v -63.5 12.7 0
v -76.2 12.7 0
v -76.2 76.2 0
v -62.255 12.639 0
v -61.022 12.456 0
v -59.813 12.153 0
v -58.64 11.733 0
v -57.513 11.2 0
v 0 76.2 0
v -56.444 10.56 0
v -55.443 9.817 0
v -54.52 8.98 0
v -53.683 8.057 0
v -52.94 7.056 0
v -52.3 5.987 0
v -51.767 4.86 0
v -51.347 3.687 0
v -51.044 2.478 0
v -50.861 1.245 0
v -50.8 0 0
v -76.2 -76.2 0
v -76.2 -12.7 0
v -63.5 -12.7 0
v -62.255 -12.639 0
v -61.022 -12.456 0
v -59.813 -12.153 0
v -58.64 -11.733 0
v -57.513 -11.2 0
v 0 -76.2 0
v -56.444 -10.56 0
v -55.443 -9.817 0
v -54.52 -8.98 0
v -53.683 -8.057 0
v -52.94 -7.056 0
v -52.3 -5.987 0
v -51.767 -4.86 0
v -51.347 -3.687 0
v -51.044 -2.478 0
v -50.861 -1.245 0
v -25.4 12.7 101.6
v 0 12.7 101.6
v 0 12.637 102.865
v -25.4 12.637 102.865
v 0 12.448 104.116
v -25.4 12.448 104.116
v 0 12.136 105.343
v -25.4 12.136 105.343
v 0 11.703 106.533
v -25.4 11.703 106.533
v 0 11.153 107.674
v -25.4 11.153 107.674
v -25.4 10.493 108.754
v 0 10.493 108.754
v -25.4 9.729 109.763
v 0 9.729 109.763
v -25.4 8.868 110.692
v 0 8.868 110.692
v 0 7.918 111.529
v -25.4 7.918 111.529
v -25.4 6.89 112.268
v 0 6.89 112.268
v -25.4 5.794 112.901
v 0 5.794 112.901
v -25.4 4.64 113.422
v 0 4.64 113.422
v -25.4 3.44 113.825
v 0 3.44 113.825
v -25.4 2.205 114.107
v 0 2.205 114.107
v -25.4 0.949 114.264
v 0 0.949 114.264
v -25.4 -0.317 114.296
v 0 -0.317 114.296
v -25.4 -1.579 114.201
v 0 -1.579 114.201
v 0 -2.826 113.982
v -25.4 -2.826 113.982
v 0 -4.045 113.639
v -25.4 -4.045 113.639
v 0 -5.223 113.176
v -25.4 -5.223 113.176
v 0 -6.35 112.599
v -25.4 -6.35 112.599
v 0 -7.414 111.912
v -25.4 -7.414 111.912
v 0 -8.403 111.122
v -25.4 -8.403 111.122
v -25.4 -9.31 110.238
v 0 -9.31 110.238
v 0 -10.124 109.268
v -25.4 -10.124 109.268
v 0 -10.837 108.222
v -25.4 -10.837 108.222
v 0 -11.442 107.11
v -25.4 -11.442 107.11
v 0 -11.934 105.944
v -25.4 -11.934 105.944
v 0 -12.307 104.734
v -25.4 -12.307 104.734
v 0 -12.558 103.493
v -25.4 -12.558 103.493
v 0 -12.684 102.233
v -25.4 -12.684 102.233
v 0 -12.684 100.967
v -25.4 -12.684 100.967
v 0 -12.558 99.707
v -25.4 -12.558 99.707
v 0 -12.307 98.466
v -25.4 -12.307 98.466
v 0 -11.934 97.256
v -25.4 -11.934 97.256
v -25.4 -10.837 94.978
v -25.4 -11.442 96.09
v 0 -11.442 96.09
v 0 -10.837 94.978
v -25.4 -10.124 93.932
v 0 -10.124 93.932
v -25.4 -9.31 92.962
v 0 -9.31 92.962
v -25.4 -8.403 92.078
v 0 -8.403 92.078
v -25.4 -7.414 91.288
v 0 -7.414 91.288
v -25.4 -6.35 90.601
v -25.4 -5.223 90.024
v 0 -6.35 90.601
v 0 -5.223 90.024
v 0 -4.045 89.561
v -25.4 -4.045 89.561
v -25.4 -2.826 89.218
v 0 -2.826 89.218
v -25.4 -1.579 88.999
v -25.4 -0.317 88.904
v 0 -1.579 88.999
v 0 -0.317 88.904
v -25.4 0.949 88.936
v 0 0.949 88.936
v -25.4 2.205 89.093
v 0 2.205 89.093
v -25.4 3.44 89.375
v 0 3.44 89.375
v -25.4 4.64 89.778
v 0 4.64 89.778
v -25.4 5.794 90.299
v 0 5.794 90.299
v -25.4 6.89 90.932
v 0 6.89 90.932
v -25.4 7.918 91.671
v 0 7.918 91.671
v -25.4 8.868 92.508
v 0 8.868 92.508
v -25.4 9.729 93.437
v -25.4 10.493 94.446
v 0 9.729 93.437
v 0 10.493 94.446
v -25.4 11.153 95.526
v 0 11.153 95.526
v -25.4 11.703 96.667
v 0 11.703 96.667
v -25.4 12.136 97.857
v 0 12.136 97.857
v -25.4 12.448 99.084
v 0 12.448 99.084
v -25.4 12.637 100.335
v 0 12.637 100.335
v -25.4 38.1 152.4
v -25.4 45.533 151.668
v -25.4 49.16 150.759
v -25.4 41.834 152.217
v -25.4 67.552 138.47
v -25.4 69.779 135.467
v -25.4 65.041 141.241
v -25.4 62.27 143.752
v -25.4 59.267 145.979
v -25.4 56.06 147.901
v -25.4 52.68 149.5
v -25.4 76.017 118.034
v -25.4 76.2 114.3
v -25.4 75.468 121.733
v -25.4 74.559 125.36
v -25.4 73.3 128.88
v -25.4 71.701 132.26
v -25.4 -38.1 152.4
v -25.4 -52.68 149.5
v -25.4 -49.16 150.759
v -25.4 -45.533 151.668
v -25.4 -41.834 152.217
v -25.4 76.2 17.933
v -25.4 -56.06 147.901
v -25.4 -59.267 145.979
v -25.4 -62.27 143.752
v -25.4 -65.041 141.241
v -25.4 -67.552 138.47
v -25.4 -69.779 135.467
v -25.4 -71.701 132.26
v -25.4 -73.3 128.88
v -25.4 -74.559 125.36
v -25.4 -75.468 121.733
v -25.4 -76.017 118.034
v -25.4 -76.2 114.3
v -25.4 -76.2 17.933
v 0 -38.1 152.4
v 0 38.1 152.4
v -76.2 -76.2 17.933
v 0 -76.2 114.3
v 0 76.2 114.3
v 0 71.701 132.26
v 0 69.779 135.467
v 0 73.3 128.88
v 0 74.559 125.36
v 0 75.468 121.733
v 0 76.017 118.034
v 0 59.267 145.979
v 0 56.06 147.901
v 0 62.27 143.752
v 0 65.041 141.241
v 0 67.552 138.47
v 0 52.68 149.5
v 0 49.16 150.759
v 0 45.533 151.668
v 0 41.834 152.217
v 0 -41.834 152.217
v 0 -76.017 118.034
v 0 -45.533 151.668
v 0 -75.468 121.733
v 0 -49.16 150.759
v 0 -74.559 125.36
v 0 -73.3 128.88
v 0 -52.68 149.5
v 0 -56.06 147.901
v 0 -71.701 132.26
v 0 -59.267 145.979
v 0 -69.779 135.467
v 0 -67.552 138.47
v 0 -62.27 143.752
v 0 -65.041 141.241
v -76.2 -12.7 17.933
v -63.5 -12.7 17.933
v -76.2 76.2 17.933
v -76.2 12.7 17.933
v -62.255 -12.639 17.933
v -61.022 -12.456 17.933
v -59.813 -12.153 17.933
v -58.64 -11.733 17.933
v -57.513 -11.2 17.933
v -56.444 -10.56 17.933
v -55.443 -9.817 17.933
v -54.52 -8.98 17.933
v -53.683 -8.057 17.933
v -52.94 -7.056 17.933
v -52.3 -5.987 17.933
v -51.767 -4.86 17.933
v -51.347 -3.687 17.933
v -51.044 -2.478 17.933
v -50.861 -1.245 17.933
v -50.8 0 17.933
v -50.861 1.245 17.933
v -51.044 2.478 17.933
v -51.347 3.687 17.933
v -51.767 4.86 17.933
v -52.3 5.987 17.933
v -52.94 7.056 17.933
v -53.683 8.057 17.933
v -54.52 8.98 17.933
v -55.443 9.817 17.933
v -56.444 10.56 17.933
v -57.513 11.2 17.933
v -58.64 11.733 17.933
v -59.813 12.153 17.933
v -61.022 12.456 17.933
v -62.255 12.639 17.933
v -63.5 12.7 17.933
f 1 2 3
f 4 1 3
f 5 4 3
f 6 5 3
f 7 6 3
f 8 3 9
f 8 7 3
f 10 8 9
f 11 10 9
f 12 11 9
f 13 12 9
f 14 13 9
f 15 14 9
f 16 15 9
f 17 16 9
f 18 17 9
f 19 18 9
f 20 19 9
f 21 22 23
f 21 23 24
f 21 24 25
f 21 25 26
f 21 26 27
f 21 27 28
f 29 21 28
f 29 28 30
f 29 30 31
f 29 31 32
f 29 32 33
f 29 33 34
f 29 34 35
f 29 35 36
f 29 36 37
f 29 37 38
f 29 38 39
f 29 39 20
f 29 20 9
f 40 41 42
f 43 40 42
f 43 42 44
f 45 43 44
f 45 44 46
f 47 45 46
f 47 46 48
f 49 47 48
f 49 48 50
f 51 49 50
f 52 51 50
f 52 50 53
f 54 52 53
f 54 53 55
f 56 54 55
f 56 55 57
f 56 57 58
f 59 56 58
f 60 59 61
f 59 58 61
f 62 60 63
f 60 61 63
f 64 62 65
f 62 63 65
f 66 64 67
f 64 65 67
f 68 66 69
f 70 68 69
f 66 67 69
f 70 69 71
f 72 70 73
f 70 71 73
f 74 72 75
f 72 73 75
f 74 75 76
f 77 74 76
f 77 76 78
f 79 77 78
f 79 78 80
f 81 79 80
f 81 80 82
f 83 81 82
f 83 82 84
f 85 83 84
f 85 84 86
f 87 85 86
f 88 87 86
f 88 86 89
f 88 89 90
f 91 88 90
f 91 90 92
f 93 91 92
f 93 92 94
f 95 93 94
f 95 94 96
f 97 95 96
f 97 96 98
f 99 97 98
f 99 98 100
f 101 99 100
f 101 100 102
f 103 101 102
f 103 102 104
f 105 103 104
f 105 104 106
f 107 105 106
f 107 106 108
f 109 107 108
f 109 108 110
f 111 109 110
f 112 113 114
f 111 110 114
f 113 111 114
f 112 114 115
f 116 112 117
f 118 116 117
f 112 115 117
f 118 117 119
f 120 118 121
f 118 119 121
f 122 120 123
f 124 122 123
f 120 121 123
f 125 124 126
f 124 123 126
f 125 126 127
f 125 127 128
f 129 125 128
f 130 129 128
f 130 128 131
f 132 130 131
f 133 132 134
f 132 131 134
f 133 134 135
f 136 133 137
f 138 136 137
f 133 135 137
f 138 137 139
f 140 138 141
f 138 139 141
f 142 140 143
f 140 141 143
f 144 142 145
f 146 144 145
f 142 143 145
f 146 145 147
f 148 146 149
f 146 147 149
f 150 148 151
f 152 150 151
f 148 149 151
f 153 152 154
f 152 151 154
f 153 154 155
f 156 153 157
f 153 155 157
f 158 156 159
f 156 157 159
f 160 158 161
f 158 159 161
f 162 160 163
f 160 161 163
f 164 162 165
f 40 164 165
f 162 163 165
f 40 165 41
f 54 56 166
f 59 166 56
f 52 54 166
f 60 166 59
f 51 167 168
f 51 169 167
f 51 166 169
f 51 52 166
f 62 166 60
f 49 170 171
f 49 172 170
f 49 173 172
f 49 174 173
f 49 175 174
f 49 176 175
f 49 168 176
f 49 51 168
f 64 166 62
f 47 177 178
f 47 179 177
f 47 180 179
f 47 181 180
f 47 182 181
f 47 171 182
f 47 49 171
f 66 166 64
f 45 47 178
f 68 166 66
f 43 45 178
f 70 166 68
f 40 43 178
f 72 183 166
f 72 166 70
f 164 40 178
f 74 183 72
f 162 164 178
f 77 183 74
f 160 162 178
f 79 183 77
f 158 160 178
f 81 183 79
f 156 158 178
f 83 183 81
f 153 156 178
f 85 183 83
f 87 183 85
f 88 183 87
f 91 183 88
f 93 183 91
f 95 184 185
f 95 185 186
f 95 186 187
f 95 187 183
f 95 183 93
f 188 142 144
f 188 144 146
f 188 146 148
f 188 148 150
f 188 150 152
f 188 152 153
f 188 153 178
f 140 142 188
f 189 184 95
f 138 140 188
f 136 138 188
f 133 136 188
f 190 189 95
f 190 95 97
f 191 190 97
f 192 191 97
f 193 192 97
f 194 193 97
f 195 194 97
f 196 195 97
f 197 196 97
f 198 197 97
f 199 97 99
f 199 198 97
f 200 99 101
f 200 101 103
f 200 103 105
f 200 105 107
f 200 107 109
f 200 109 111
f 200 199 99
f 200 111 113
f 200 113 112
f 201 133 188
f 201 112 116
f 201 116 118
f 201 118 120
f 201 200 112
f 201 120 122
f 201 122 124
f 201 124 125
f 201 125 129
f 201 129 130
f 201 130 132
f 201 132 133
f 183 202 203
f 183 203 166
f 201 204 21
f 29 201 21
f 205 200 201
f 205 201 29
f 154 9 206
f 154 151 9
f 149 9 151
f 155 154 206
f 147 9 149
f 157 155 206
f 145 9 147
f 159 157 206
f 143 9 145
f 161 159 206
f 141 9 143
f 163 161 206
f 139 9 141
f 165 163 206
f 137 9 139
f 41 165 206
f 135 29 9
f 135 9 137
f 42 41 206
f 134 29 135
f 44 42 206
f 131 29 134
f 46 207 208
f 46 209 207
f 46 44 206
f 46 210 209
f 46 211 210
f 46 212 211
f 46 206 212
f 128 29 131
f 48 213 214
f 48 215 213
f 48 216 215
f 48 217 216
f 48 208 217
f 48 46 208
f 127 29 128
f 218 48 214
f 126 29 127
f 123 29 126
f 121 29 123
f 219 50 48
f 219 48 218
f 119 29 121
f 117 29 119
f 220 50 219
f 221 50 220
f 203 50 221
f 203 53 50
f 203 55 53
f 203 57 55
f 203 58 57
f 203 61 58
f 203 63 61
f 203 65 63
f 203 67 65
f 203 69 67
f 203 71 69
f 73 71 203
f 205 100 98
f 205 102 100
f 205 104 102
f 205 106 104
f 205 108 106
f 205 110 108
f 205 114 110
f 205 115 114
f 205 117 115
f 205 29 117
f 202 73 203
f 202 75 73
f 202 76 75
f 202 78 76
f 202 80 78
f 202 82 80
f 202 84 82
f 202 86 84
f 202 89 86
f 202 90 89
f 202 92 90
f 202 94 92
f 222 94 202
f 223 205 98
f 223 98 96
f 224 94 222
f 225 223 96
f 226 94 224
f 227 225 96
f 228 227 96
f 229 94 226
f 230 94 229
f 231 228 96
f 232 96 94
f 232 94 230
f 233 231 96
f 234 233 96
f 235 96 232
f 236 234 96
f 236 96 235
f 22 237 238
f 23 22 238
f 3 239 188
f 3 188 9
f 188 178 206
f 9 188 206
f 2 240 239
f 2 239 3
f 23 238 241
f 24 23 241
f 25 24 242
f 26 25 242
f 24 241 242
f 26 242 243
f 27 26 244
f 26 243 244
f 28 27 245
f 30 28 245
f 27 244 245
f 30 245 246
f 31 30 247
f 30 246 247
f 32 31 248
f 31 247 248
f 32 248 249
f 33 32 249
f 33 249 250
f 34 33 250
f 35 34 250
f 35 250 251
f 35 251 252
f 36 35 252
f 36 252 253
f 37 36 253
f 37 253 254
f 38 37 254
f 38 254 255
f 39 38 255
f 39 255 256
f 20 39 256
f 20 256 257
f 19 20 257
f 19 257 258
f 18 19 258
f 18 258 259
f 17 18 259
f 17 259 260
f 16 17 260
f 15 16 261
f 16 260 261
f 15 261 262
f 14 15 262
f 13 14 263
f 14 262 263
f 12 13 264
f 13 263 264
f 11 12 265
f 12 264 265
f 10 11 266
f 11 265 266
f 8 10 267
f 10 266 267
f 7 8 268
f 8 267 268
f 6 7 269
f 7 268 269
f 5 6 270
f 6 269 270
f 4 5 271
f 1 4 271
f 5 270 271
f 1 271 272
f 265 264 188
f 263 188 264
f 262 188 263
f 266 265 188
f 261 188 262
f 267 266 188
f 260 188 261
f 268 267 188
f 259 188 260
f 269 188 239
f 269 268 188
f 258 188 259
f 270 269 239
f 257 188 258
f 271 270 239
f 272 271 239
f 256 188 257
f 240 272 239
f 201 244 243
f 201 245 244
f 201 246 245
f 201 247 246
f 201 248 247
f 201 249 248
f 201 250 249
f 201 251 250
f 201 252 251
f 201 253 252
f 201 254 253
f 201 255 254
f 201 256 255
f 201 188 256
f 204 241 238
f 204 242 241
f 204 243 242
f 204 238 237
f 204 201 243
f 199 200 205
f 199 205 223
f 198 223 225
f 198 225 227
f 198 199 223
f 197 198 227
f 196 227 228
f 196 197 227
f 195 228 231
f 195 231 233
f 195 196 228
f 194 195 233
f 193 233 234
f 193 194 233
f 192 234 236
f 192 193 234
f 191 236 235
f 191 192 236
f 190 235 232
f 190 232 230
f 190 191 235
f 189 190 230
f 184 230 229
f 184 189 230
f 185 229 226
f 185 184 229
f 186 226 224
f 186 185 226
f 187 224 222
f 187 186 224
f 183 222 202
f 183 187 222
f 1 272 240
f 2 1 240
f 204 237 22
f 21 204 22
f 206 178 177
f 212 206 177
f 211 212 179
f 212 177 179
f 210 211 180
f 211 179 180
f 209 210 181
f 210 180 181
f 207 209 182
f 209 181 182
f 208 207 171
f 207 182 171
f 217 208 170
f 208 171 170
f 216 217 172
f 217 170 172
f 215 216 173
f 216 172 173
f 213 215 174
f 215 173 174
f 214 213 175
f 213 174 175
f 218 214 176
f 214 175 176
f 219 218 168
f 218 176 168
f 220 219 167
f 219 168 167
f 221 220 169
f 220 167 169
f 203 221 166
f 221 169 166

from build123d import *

# Parameters (mm, degrees)
F1_DEPTH = 76.2
F2_R     = 12.7
F3_DEPTH = 76.201
F5_DEPTH = 17.9342755506
F7_DEPTH = 25.401


# Not quite as in the source:
# - a pattern or mirror of a feature is missing from the dataset's text; its kind, count and spacing are read off the source's solid


with BuildPart() as f1:
    # F0 (on Front) → F1 (new body, symmetric)
    with BuildSketch(Plane.XZ):
        Polygon((0, 0), (0, 152.4), (-25.4, 152.4), (-25.4, 17.9332755506), (-76.2, 17.9332755506), (-76.2, 0), align=None)
    extrude(amount=F1_DEPTH, both=True)

    # F2 (on face) → F3 (cut, through all)
    with BuildSketch(Plane.YZ):
        with Locations((0, 101.6)):
            Circle(F2_R)
    extrude(amount=-F3_DEPTH, mode=Mode.SUBTRACT)

    # F4 (on face) → F5 (cut, through all)
    with BuildSketch(Plane.XY.offset(17.9332755506)):
        with BuildLine():
            Line((-63.5, 12.7), (-76.2, 12.7))
            Line((-76.2, 12.7), (-76.2, -12.7))
            Line((-76.2, -12.7), (-63.5, -12.7))
            ThreePointArc((-63.5, -12.7), (-50.8, 0), (-63.5, 12.7))
        make_face()
    extrude(amount=-F5_DEPTH, mode=Mode.SUBTRACT)

    # F6 (on face) → F7 (cut, through all)
    with BuildSketch(Plane(origin=(-25.4, 0, 0), x_dir=(0, -1, 0), z_dir=(-1, 0, 0))):
        with BuildLine():
            ThreePointArc((-76.2, 114.3), (-65.0407683632, 141.2407683632), (-38.1, 152.4))
            Line((-38.1, 152.4), (-76.2, 152.4))
            Line((-76.2, 152.4), (-76.2, 114.3))
        make_face()
    f7 = extrude(amount=-F7_DEPTH, mode=Mode.SUBTRACT)

    # F7_copies: F7 across plane
    add(f7.mirror(Plane(origin=(0, 0, 0), x_dir=(0, 0, -1), z_dir=(0, -1, 0))), mode=Mode.SUBTRACT)


solid = f1.part
